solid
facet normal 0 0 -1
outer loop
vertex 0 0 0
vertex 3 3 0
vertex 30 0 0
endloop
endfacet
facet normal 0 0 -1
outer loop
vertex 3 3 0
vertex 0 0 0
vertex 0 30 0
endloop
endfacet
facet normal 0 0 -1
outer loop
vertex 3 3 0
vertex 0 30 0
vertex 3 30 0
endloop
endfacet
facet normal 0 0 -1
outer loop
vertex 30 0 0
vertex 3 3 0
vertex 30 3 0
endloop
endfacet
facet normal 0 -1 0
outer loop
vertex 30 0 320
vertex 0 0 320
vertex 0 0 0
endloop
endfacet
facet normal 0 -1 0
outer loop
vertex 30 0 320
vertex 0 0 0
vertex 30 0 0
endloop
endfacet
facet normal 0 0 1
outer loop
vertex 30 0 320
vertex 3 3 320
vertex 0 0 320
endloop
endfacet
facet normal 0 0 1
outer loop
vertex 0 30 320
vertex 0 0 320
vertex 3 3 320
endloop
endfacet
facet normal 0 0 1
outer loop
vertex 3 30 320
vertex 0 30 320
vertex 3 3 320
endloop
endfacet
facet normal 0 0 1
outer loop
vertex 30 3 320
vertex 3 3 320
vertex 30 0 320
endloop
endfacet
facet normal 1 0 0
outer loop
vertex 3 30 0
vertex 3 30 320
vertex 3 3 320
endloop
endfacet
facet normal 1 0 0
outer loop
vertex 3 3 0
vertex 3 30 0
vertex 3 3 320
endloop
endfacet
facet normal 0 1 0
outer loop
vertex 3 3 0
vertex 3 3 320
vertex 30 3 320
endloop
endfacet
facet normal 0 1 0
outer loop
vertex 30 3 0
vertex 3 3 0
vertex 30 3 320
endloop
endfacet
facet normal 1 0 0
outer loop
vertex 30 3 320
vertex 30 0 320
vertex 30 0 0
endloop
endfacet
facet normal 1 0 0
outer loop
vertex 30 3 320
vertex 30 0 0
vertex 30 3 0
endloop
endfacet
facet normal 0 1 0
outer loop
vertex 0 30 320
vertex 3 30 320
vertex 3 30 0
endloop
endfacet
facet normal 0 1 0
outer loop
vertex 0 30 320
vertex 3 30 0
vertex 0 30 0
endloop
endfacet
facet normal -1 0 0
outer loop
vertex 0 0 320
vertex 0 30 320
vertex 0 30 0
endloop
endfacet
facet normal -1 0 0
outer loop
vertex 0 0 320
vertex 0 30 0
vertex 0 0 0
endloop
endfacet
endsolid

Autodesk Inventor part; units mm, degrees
ref_plane "YZ Plane" through (0, 0, 0) normal (1, 0, 0) x (0, 1, 0)
ref_plane "XZ Plane" through (0, 0, 0) normal (0, 1, 0) x (-1, 0, 0)
ref_plane "XY Plane" through (0, 0, 0) normal (0, 0, 1) x (1, 0, 0)
sketch "Sketch1" plane through (0, 0, 0) normal (0, 0, 1) x (1, 0, 0)
  line L0 (0, 0) -> (30, 0)
  line L1 (30, 0) -> (30, 30)
  line L2 (30, 30) -> (0, 30)
  line L3 (0, 30) -> (0, 0)
  line L4 (30, 30) -> (3, 30)
  line L5 (3, 30) -> (3, 3)
  line L6 (3, 3) -> (30, 3)
  line L7 (30, 3) -> (30, 30)
  point P0 (3, 30)
  dimension "d0" = 30
  dimension "d1" = 30
  dimension "d4" = 27
  dimension "d5" = 27
extrude "Extrusion1" add sketch "Sketch1" along normal blind 320 contours L3 L2 L5 L6 L1 L0
properties part number "frame side" material "Aluminum 6061"
